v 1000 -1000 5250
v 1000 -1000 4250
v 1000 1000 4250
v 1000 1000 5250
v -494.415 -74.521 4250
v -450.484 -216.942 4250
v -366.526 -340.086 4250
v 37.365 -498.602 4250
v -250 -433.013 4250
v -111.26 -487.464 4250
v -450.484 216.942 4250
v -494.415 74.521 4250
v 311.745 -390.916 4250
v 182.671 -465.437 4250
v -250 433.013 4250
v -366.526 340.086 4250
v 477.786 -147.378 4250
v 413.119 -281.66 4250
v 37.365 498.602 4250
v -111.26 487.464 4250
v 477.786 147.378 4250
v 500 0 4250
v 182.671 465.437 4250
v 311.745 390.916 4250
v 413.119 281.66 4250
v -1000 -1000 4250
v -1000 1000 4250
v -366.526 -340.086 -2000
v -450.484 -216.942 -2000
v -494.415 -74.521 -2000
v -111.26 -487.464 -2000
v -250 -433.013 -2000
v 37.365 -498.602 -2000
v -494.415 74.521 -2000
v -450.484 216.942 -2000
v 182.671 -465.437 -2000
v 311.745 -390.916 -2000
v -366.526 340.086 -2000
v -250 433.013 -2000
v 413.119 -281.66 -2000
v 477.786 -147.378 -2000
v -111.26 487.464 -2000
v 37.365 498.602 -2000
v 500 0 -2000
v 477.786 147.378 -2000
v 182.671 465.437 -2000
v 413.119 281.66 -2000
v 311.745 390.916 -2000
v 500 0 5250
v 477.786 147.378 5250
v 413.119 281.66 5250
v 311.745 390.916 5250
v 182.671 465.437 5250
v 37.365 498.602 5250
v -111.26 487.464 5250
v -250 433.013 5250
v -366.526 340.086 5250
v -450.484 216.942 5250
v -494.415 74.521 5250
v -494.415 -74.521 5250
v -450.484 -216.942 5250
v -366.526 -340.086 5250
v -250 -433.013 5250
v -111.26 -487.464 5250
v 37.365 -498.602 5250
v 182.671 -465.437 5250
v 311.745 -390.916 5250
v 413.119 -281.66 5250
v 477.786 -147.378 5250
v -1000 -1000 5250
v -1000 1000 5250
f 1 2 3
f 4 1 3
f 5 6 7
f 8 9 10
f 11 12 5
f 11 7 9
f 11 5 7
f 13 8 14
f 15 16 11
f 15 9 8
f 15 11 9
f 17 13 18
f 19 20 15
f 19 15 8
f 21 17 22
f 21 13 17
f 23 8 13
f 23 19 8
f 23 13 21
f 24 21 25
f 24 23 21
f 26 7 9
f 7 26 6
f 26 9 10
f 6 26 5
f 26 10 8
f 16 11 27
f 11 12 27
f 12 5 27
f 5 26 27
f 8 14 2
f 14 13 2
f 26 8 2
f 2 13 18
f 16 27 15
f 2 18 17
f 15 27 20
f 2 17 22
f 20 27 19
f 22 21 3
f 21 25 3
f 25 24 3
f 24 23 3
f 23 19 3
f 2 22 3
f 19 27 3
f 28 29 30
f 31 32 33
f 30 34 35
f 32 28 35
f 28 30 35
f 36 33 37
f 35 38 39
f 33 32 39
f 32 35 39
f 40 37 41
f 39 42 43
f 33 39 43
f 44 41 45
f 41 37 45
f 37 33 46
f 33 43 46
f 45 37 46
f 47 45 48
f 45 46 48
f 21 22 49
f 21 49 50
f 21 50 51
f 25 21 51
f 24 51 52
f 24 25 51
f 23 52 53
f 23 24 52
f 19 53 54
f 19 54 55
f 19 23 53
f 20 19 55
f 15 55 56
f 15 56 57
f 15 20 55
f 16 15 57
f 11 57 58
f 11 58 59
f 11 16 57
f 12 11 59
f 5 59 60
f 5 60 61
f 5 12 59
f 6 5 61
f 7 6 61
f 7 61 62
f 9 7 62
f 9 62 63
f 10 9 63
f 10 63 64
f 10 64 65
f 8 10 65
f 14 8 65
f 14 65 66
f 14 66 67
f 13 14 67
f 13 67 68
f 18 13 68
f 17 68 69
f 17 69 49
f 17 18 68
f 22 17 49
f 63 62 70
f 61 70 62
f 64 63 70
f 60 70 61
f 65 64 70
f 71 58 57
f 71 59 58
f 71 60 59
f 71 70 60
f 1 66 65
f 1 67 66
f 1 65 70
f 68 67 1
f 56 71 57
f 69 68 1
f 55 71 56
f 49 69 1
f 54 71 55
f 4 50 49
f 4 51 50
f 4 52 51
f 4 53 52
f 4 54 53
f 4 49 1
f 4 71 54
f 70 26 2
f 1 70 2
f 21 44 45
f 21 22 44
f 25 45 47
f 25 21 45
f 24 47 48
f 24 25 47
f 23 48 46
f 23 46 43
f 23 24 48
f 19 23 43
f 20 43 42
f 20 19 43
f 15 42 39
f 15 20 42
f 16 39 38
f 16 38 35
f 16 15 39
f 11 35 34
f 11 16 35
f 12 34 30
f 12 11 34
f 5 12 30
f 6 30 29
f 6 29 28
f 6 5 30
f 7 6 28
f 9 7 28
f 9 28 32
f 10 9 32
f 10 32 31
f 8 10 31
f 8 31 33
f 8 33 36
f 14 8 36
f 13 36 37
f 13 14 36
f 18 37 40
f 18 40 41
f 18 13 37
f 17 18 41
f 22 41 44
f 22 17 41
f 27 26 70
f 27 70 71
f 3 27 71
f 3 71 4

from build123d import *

# Parameters (mm, degrees)
F0_R     = 500
F1_DEPTH = 4250
F2_W     = 2000
F2_H     = 2000
F2_R     = 500
F3_DEPTH = 1000
F4_DEPTH = 2000


with BuildPart() as f1:
    # F0 (on Top) → F1 (new body)
    with BuildSketch(Plane.XY):
        Circle(F0_R)
    extrude(amount=F1_DEPTH)

    # F4 (add): a face of the model
    f4_faces = [f1.faces().sort_by_distance(p)[0] for p in [
        (0, 0, 0),
    ]]
    extrude(f4_faces, amount=F4_DEPTH)


with BuildPart() as f3:
    # F2 (on face) → F3 (new body)
    with BuildSketch(Plane.XY.offset(4250)):
        Rectangle(F2_W, F2_H)
        Circle(F2_R, mode=Mode.SUBTRACT)
    extrude(amount=F3_DEPTH)


solid = Compound([f1.part, f3.part])
